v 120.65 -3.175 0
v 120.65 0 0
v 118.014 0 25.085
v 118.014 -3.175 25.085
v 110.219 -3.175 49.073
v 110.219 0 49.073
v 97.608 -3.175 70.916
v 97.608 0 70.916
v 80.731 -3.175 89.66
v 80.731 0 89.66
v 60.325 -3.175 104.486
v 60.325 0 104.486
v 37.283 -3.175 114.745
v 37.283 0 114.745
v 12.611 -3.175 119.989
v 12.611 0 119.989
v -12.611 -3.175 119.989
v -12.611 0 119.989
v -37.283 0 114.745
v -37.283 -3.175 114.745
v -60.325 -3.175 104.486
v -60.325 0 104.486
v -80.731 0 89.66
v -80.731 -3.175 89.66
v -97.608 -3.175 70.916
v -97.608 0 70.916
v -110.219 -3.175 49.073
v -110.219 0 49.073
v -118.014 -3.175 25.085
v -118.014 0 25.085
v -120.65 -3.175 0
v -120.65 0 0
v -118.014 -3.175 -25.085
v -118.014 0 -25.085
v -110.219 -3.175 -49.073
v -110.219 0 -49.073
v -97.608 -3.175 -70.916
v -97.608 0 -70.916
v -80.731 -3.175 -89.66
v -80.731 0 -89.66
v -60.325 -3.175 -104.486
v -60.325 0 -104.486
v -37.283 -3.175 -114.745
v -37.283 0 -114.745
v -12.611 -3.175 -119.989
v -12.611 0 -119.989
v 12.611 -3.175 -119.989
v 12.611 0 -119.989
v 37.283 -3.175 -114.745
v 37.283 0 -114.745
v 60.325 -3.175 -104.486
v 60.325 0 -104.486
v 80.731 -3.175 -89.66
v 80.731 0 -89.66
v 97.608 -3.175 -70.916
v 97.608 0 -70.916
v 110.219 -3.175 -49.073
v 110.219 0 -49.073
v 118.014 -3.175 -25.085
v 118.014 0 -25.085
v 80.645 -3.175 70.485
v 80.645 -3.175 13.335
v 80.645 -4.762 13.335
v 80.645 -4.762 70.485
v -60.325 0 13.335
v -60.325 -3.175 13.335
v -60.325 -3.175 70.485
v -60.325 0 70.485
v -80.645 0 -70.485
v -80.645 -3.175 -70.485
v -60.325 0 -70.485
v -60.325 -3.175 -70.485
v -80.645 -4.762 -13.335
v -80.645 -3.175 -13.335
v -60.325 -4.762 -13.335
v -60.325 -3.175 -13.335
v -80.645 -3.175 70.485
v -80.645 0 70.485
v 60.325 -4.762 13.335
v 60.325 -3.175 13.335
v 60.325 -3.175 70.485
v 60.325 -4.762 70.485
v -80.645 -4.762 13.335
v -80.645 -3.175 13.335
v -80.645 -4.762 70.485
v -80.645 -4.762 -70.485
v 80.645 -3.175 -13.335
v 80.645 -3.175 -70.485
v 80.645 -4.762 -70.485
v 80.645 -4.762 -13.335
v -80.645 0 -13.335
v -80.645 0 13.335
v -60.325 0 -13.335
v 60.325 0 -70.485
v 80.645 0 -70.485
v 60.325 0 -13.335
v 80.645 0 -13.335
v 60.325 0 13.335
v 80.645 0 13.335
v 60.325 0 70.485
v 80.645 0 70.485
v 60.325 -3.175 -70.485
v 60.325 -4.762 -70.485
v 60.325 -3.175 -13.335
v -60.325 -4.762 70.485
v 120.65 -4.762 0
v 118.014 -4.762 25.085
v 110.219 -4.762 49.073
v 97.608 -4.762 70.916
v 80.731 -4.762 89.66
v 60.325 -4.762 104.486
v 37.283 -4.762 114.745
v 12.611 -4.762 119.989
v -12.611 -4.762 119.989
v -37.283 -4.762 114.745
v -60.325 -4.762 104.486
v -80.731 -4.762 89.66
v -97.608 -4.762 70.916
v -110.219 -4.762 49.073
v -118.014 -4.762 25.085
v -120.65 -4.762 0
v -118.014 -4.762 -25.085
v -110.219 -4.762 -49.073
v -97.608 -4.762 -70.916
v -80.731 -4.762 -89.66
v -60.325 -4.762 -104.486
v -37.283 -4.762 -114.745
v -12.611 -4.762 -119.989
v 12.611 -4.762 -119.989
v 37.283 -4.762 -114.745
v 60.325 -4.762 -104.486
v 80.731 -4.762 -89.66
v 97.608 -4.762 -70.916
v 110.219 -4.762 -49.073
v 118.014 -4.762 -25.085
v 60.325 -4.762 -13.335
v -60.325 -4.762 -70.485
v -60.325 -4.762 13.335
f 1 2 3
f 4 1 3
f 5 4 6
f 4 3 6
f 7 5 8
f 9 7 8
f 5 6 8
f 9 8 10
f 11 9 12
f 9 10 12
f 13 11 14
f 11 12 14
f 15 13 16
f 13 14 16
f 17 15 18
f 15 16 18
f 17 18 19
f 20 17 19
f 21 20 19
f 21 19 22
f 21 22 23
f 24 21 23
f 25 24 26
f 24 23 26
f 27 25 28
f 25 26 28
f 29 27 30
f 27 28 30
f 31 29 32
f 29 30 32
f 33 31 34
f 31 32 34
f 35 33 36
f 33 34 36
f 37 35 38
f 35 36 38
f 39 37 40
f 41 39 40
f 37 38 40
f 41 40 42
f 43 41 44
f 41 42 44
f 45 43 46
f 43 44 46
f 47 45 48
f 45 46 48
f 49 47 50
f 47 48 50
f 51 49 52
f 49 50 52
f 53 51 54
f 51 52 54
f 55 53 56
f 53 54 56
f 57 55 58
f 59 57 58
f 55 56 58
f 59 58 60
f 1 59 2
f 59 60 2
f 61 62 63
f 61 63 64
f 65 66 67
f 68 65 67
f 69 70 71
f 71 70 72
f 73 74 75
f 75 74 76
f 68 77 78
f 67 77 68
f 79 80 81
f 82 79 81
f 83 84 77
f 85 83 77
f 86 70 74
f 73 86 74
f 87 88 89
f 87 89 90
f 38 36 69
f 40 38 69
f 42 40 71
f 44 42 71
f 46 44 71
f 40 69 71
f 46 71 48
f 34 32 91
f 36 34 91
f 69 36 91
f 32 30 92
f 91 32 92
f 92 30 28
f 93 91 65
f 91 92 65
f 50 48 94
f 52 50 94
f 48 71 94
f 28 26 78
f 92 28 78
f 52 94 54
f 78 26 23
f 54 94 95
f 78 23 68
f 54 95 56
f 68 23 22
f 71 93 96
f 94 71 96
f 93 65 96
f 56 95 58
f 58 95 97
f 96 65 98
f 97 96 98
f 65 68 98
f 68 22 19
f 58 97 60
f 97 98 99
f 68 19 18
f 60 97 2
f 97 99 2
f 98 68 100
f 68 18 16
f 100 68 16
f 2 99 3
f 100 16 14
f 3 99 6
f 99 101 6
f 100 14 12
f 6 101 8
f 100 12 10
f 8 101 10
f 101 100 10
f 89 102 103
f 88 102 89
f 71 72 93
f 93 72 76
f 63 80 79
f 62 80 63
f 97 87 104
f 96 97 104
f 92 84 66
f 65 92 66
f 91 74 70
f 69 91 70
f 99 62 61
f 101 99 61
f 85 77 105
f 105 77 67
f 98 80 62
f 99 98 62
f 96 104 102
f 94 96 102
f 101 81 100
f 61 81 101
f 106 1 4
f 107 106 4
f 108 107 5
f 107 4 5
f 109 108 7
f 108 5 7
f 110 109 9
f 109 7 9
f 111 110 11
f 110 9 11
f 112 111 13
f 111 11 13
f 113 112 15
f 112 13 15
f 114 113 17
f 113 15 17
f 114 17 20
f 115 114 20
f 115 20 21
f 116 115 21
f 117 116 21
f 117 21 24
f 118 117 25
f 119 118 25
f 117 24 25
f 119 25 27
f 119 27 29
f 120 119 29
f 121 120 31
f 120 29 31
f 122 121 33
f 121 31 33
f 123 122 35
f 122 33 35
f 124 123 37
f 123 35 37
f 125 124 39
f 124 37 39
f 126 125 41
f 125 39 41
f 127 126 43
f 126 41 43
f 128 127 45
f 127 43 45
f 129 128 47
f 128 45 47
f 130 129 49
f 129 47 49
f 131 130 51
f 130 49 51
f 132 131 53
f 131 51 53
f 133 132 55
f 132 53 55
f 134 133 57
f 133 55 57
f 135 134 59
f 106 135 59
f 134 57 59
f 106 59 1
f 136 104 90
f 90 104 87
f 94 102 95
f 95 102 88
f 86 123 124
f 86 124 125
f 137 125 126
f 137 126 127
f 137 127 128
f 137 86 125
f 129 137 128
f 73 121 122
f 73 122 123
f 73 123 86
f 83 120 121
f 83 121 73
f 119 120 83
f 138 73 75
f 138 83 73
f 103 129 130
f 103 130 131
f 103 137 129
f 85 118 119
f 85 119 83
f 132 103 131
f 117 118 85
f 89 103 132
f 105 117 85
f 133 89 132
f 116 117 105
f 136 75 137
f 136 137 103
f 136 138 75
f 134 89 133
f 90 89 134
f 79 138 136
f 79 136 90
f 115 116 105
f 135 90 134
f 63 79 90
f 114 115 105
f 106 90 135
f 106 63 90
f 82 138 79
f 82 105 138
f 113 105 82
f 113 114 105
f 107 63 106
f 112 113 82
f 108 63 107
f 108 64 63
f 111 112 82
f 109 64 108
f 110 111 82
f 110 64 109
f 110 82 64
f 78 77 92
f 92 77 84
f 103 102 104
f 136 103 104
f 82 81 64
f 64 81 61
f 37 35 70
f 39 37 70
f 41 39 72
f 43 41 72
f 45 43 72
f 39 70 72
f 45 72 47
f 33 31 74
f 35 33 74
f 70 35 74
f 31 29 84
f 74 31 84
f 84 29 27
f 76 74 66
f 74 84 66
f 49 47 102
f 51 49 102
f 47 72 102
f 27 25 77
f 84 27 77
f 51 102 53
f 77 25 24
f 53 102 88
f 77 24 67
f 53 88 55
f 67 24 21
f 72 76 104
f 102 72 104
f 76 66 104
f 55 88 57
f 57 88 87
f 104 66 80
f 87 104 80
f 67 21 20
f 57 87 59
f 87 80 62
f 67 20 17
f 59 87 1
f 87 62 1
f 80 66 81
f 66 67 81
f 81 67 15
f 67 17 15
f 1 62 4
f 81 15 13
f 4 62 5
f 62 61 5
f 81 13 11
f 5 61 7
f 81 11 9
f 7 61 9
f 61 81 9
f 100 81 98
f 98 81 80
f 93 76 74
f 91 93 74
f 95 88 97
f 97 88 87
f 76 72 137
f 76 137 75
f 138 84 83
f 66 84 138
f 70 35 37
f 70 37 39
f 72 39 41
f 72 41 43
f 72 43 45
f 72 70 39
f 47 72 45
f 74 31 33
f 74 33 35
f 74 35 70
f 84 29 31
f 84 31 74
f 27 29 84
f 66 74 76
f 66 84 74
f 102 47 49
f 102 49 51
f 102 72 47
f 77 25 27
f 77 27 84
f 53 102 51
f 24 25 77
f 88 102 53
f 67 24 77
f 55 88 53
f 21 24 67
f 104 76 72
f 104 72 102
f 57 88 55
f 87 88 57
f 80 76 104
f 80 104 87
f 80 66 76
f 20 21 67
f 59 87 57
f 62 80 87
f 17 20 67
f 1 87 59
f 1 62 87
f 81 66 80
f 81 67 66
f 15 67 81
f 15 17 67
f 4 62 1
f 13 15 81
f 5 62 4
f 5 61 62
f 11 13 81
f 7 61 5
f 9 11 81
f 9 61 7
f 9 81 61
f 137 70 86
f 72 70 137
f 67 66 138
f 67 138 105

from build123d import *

# Parameters (mm, degrees)
F0_R     = 120.65
F1_DEPTH = 3.175
F2_W     = 20.32
F2_H     = 28.575
F3_DEPTH = 25.4
F4_R     = 120.65
F4_W     = 20.32
F4_H     = 57.15
F5_DEPTH = 1.5875


with BuildPart() as f1:
    # F0 (on Front) → F1 (new body)
    with BuildSketch(Plane.XZ):
        Circle(F0_R)
    extrude(amount=F1_DEPTH)

    # F2 (on face) → F3 (cut)
    with BuildSketch(Plane.XZ.offset(3.175)):
        Polygon((80.645, 41.91), (60.325, 41.91), (60.325, 13.335), (70.485, 13.335), (80.645, 13.335), align=None)
        with Locations((70.485, 56.1975)):
            Rectangle(F2_W, F2_H)
        Polygon((60.325, -13.335), (60.325, -41.91), (80.645, -41.91), (80.645, -13.335), (70.485, -13.335), align=None)
        with Locations((70.485, -56.1975)):
            Rectangle(F2_W, F2_H)
        with Locations((-70.485, -56.1975)):
            Rectangle(F2_W, F2_H)
        Polygon((-80.645, -41.91), (-60.325, -41.91), (-60.325, -13.335), (-70.485, -13.335), (-80.645, -13.335), align=None)
        Polygon((-60.325, 13.335), (-60.325, 41.91), (-80.645, 41.91), (-80.645, 13.335), (-70.485, 13.335), align=None)
        with Locations((-70.485, 56.1975)):
            Rectangle(F2_W, F2_H)
    extrude(amount=-F3_DEPTH, mode=Mode.SUBTRACT)


with BuildPart() as f5:
    # F4 (on face) → F5 (new body)
    with BuildSketch(Plane.XZ.offset(3.175)):
        Circle(F4_R)
        with Locations((-70.485, -41.91)):
            Rectangle(F4_W, F4_H, mode=Mode.SUBTRACT)
        with Locations((70.485, -41.91)):
            Rectangle(F4_W, F4_H, mode=Mode.SUBTRACT)
        with Locations((-70.485, 41.91)):
            Rectangle(F4_W, F4_H, mode=Mode.SUBTRACT)
        with Locations((70.485, 41.91)):
            Rectangle(F4_W, F4_H, mode=Mode.SUBTRACT)
    extrude(amount=F5_DEPTH)


solid = Compound([f1.part, f5.part])
